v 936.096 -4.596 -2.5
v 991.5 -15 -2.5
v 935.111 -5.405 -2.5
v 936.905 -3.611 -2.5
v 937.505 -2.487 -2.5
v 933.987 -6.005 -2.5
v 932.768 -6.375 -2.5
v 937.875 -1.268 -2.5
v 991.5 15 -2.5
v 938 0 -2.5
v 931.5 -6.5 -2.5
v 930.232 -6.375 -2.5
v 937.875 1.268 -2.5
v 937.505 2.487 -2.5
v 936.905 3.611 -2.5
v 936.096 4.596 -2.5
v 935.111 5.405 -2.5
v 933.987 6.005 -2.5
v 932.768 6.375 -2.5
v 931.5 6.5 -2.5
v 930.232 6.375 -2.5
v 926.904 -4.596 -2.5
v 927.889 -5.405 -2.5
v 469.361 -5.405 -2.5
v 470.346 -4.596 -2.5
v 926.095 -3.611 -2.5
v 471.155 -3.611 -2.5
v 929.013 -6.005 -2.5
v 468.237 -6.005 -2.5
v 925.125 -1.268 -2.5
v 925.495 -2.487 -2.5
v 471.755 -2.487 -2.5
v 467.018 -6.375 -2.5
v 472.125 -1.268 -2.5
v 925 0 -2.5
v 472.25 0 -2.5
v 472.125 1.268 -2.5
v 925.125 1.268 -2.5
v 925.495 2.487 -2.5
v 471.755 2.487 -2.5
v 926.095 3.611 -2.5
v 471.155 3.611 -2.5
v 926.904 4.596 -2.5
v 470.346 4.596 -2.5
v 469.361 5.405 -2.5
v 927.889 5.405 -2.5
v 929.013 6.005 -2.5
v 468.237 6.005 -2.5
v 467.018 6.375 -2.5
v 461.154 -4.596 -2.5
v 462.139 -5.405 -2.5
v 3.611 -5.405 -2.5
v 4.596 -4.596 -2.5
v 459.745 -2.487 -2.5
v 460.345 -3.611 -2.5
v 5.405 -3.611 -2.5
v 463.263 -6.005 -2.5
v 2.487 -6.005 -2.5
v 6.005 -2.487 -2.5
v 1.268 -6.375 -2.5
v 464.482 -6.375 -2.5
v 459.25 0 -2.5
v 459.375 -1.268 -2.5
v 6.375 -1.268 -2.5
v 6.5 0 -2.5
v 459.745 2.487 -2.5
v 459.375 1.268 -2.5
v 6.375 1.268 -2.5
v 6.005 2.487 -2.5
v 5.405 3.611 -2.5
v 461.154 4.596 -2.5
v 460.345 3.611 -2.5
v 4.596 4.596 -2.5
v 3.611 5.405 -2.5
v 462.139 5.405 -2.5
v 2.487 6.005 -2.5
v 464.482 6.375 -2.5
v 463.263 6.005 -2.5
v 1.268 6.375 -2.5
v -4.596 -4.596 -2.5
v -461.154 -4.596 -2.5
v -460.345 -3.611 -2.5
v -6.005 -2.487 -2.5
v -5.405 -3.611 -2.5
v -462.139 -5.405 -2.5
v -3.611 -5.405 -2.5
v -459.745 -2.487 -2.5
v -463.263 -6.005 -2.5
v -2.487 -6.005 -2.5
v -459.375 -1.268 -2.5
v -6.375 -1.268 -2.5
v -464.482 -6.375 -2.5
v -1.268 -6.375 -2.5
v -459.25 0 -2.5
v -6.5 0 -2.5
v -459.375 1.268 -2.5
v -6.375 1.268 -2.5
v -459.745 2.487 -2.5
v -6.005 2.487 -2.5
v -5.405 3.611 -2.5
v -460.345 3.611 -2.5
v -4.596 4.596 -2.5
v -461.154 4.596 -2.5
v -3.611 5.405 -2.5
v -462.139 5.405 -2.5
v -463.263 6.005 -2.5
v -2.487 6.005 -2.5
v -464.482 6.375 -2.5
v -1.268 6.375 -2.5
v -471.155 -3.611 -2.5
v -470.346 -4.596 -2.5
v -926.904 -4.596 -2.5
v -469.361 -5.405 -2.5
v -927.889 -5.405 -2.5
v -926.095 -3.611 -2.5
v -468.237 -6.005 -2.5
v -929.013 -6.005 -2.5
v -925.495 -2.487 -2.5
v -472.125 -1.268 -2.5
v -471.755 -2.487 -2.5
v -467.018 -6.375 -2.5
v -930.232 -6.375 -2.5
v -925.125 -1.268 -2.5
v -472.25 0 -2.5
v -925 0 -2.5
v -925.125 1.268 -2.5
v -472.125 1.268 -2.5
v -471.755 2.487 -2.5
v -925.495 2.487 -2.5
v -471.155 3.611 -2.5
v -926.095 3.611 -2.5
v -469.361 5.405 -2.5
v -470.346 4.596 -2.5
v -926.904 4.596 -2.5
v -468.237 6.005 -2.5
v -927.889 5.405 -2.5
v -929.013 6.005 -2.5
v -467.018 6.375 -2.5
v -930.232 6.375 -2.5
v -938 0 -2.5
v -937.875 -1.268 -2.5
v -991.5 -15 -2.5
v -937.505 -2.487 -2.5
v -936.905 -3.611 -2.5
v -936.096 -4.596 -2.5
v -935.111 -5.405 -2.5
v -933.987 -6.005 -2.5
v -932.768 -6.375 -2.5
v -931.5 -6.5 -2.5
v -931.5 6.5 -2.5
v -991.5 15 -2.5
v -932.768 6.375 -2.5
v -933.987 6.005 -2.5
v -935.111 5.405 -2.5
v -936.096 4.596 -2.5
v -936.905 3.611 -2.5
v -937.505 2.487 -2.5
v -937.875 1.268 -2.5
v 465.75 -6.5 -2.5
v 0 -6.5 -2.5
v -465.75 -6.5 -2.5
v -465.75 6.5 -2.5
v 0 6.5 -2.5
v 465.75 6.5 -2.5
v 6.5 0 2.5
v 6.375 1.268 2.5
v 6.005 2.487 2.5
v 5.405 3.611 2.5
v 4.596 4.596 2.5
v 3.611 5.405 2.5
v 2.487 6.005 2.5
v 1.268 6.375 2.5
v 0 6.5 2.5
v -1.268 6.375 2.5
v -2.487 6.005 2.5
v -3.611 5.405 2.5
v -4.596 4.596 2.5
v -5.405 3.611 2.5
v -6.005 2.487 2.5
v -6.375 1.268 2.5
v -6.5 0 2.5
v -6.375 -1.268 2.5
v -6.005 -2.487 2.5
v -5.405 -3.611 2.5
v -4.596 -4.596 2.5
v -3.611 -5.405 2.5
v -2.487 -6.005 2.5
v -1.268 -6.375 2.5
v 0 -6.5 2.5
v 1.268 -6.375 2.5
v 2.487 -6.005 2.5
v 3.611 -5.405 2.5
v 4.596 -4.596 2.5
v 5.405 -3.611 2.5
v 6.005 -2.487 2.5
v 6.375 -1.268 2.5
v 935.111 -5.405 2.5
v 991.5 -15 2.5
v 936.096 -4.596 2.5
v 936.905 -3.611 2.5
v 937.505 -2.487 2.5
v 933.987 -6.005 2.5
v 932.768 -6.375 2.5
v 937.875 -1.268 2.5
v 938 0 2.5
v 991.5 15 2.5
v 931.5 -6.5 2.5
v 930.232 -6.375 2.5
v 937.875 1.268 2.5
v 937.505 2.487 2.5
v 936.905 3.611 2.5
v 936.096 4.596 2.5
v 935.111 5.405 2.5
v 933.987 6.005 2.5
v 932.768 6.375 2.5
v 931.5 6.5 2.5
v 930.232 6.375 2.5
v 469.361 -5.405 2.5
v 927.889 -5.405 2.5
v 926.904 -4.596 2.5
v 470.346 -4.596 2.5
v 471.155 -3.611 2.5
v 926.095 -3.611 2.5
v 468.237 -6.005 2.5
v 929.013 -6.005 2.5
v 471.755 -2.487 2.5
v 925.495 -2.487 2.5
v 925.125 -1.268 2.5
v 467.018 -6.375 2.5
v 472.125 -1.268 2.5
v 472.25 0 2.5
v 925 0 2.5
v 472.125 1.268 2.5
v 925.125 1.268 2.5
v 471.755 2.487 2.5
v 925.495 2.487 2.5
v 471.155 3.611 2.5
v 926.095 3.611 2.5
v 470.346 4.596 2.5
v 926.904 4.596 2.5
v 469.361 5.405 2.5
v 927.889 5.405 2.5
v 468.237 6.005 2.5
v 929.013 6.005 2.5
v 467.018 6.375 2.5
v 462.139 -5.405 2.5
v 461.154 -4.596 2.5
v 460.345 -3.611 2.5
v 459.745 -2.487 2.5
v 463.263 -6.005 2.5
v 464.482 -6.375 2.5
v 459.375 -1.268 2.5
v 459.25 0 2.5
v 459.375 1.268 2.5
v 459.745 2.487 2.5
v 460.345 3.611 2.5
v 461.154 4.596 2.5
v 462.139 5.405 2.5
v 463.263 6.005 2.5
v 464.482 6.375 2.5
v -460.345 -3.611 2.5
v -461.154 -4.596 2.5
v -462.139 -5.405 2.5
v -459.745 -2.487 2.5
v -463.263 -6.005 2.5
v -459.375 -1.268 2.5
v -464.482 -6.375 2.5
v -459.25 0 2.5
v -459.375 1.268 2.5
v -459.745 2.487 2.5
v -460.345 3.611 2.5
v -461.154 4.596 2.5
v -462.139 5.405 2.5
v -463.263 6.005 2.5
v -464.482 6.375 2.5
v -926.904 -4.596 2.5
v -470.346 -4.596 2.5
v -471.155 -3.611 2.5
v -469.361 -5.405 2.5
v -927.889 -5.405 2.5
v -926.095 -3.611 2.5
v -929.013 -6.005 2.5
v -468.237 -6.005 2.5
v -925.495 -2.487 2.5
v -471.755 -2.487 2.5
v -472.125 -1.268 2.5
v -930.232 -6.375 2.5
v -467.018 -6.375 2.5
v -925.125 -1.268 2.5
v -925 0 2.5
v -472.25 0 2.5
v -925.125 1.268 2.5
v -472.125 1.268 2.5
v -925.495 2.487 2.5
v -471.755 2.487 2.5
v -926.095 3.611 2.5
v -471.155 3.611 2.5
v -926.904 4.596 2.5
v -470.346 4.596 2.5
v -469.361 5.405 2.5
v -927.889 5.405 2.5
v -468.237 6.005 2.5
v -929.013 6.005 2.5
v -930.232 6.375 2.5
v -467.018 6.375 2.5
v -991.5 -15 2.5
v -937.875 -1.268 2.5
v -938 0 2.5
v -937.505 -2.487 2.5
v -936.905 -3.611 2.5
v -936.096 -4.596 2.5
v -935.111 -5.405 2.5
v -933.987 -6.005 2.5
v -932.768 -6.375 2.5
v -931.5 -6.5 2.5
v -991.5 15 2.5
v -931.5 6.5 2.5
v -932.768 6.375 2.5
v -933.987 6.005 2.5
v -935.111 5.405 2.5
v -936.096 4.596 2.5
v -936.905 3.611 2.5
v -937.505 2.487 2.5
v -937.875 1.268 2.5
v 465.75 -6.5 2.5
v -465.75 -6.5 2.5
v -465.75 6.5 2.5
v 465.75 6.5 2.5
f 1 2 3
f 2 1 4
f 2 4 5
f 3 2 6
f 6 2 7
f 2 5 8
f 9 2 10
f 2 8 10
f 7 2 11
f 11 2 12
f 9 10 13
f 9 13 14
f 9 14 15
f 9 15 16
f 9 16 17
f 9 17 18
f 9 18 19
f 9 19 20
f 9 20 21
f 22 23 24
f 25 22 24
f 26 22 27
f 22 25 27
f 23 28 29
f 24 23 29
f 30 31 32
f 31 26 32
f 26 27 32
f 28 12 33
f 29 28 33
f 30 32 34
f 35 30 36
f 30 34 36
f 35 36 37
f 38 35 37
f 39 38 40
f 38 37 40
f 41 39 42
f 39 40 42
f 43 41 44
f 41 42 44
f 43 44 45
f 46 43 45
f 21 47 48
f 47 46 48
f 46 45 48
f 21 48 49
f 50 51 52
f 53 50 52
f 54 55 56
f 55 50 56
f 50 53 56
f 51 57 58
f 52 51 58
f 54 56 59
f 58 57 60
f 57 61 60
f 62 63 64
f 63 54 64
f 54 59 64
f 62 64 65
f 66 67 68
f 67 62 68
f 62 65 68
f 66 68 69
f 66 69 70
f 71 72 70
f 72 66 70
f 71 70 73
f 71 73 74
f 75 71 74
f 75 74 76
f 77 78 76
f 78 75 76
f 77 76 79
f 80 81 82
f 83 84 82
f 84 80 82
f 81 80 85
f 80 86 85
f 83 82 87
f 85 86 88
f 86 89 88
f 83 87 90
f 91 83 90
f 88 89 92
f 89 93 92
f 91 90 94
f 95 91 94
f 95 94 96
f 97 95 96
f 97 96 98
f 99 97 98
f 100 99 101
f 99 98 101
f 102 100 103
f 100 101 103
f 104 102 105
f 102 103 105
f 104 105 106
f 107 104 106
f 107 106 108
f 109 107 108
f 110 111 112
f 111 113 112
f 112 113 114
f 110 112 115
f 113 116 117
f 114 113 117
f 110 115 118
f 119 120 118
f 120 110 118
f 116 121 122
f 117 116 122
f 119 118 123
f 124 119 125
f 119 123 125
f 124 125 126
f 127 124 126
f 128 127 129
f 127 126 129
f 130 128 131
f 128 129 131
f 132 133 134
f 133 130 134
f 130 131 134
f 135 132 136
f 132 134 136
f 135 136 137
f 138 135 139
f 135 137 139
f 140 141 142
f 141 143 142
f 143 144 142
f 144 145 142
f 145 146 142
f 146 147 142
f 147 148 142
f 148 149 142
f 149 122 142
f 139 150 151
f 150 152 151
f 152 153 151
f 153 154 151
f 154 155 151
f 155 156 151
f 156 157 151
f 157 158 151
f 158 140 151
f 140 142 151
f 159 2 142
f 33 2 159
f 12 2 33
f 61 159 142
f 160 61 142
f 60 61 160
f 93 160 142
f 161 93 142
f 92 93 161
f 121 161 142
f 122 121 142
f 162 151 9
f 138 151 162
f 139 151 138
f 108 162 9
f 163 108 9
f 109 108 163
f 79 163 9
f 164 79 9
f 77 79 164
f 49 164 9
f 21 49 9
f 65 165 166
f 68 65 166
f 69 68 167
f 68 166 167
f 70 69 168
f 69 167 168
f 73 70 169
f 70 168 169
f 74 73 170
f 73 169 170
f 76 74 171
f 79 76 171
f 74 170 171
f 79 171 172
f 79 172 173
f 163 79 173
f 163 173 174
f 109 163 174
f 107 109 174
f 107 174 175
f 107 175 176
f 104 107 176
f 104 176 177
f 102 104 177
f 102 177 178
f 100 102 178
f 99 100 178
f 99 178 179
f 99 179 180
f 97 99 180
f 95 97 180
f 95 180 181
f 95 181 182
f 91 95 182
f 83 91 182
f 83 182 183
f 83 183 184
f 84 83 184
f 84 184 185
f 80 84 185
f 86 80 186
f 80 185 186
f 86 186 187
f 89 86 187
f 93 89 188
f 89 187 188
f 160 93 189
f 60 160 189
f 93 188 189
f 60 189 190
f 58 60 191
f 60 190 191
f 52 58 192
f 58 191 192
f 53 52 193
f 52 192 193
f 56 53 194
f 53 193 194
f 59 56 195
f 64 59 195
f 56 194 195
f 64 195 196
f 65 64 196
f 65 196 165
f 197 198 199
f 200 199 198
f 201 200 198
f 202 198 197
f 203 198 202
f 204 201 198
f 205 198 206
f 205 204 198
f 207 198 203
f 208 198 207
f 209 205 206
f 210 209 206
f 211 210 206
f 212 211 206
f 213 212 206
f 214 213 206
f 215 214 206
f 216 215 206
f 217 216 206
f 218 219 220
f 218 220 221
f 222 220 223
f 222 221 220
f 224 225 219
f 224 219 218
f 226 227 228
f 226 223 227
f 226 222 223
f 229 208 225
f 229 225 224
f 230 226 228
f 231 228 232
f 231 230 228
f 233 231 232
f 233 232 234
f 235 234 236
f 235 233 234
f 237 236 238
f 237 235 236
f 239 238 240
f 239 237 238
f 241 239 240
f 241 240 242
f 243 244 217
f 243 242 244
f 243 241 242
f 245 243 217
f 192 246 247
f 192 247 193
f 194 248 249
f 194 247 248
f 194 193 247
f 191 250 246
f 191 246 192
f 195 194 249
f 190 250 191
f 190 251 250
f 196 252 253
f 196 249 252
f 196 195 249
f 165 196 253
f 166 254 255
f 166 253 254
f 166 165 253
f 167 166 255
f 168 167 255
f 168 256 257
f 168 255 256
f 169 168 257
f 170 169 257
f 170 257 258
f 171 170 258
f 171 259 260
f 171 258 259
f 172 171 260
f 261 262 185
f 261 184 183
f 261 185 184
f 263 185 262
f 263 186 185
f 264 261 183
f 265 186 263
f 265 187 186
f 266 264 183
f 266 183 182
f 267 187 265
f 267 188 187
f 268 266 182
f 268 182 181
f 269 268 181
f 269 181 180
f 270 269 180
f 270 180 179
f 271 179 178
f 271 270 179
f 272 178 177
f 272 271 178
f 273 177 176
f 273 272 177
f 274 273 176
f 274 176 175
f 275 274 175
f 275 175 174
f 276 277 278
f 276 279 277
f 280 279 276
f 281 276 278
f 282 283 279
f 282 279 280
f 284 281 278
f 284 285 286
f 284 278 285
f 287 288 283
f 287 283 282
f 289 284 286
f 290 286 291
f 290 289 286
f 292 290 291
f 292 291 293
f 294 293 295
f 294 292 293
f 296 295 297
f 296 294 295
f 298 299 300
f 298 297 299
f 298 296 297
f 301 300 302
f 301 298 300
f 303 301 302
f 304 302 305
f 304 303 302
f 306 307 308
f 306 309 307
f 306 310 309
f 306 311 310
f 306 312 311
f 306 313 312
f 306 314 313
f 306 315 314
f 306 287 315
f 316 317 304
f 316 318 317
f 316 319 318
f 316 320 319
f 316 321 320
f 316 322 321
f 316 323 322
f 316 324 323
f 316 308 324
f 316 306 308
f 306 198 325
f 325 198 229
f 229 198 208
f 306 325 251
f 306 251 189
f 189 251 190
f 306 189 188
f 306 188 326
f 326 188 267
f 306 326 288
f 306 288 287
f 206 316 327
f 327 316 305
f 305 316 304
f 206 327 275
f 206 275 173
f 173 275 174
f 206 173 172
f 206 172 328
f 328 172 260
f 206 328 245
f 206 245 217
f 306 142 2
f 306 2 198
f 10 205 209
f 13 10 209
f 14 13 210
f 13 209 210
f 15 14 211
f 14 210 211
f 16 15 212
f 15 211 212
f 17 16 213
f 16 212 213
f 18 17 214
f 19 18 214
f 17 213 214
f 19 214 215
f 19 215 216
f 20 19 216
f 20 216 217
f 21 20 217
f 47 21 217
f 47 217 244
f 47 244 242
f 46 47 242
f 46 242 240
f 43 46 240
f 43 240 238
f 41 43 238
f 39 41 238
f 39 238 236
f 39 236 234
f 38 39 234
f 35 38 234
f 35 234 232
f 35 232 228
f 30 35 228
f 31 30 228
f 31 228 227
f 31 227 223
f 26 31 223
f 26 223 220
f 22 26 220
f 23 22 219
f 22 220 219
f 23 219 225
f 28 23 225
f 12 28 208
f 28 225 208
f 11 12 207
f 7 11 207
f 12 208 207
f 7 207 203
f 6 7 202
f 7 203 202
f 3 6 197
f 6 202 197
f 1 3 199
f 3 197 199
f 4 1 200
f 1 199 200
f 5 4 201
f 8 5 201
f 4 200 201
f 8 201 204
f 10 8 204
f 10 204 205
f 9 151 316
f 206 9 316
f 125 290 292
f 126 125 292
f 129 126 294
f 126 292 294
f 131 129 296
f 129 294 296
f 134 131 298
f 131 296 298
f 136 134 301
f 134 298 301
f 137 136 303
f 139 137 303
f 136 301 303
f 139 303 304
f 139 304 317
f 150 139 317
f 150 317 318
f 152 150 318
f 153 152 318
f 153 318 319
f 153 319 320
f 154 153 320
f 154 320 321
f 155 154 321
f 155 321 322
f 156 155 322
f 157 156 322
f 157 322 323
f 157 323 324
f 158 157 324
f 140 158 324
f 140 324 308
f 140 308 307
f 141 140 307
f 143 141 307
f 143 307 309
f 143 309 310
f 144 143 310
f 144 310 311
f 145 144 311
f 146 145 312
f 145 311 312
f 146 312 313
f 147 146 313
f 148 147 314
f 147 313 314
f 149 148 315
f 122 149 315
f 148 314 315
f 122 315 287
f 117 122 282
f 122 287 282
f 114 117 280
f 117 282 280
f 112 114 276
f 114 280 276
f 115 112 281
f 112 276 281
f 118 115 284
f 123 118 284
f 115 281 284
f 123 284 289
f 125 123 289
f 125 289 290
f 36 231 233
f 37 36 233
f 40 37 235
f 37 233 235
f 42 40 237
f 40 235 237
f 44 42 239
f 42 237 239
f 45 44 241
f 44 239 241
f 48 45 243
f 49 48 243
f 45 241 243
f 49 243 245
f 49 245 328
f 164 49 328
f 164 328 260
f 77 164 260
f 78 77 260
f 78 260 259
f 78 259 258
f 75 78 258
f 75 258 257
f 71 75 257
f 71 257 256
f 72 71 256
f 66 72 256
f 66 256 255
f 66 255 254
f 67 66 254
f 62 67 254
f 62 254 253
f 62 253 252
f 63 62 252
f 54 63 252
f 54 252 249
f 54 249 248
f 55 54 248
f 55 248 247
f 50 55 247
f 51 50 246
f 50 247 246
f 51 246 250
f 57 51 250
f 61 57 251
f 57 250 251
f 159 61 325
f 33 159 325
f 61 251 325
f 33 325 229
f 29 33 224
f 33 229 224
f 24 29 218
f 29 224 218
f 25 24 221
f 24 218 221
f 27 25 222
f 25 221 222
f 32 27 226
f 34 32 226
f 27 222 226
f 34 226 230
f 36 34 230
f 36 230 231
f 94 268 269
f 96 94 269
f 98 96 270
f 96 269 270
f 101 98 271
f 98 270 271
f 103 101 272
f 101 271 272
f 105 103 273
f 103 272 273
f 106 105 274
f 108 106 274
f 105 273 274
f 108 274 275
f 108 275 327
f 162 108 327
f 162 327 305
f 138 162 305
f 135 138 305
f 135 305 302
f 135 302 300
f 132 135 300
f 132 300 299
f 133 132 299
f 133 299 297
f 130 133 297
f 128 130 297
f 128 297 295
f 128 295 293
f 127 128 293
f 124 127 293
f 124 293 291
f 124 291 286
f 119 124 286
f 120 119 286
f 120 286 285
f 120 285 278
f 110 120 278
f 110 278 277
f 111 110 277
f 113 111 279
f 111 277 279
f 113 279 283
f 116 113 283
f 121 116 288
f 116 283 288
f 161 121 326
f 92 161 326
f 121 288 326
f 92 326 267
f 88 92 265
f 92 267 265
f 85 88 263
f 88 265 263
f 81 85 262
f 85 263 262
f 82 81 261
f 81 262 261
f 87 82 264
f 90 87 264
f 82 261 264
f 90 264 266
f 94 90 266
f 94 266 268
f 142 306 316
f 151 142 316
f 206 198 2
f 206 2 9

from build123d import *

# Parameters (mm, degrees)
PLAT_W                          = 30
PLAT_H                          = 5
EL_MENT_M_CANO_SOUD_1_DEPTH     = 1983
DIAM_TRE_DU_PER_AGE_13_0_13_1_D = 13
R_P_TITION_LIN_AIRE2_COUNT      = 5
R_P_TITION_LIN_AIRE2_PITCH      = 465.75


with BuildPart() as part:
    # plat → Elément mécano-soudé1 (new body)
    with BuildSketch(Plane.YZ.offset(-991.5)):
        Rectangle(PLAT_W, PLAT_H)
    extrude(amount=EL_MENT_M_CANO_SOUD_1_DEPTH)

    # Diamètre du perçage Ø13.0 (13)1 (through all)
    with Locations(Plane(origin=(0, 0, -2.5), x_dir=(-1, 0, 0), z_dir=(0, 0, -1))):
        with Locations((931.5, 0)):
            diam_tre_du_per_age_13_0_13_1 = Hole(DIAM_TRE_DU_PER_AGE_13_0_13_1_D / 2)

    # Répétition linéaire2: Diamètre du perçage Ø13.0 (13)1 ×5
    with Locations(*[(i * R_P_TITION_LIN_AIRE2_PITCH, 0, 0) for i in range(1, R_P_TITION_LIN_AIRE2_COUNT)]):
        add(diam_tre_du_per_age_13_0_13_1, mode=Mode.SUBTRACT)


solid = part.part
